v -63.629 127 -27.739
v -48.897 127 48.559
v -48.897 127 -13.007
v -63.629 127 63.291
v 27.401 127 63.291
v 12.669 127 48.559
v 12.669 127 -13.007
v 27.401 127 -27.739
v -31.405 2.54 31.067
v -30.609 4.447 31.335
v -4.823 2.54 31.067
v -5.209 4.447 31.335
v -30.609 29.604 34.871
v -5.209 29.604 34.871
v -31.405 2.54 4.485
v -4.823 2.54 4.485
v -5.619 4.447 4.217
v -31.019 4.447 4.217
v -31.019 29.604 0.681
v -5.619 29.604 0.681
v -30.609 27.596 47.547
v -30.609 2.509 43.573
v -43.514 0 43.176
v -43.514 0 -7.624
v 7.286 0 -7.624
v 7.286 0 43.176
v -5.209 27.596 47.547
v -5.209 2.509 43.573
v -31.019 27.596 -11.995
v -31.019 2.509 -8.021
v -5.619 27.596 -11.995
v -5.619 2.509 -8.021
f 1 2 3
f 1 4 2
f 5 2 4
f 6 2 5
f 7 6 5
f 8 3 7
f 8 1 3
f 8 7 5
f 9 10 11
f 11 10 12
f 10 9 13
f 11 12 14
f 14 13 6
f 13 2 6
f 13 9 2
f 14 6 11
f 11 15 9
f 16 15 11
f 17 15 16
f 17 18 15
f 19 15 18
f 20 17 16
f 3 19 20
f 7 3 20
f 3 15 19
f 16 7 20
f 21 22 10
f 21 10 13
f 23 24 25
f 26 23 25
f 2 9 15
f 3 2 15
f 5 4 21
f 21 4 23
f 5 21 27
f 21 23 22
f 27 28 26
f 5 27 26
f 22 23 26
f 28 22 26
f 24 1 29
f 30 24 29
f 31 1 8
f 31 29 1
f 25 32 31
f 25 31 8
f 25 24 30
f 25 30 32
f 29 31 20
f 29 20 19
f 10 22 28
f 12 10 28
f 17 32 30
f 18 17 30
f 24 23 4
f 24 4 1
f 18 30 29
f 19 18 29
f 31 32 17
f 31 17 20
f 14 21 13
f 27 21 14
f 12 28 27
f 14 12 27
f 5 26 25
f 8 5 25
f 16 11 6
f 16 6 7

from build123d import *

# Parameters (mm, degrees)
SKETCH1_W           = 50.8
SKETCH1_H           = 50.8
BOSS_EXTRUDE1_DEPTH = 127
BOSS_EXTRUDE1_DRAFT = -9
SKETCH2_W           = 61.565647843
SKETCH2_H           = 61.565647842
CUT_EXTRUDE1_DEPTH  = 124.46
CUT_EXTRUDE1_DRAFT  = -8
CUT_EXTRUDE2_REACH  = 165.697
SKETCH3_W           = 25.4
SKETCH3_H           = 25.4
CUT_EXTRUDE3_REACH  = 161.627
SKETCH4_W           = 25.4
SKETCH4_H           = 25.4


with BuildPart() as part:
    # Sketch1 → Boss-Extrude1 (with draft: the straight prism first)
    with BuildSketch(Plane(origin=(0, 0, 0), x_dir=(1, 0, 0), z_dir=(0, 1, 0))):
        with Locations((-18.114225515, -17.77595618)):
            Rectangle(SKETCH1_W, SKETCH1_H)
    extrude(amount=BOSS_EXTRUDE1_DEPTH)
    # Boss-Extrude1: the draft: its side faces are tilted about the plane it starts from
    boss_extrude1_sides = [part.faces().sort_by_distance(p)[0] for p in [
        (-43.514225515, 63.5, 17.77595618),
        (-18.114225515, 63.5, 43.17595618),
        (7.285774485, 63.5, 17.77595618),
        (-18.114225515, 63.5, -7.62404382),
    ]]
    draft(boss_extrude1_sides, Plane(origin=(0, 0, 0), x_dir=(1, 0, 0), z_dir=(0, 1, 0)), BOSS_EXTRUDE1_DRAFT)


with BuildPart() as cut_extrude1_tool:
    # Sketch2 → Cut-Extrude1 (with draft: the straight prism first)
    with BuildSketch(Plane(origin=(0, 127, 0), x_dir=(1, 0, 0), z_dir=(0, 1, 0))):
        with Locations((-18.114225515, -17.77595618)):
            Rectangle(SKETCH2_W, SKETCH2_H)
    extrude(amount=-CUT_EXTRUDE1_DEPTH)
    # Cut-Extrude1: the draft: its side faces are tilted about the plane it starts from
    cut_extrude1_sides = [cut_extrude1_tool.faces().sort_by_distance(p)[0] for p in [
        (-48.897049437, 64.77, 17.77595618),
        (-18.114225515, 64.77, 48.558780101),
        (12.668598406, 64.77, 17.77595618),
        (-18.114225515, 64.77, -13.006867741),
    ]]
    draft(cut_extrude1_sides, Plane(origin=(0, 127, 0), x_dir=(1, 0, 0), z_dir=(0, 1, 0)), CUT_EXTRUDE1_DRAFT)


with BuildPart() as part_1:
    add(part.part)

    # Cut-Extrude1: cut by cut_extrude1_tool
    add(cut_extrude1_tool.part, mode=Mode.SUBTRACT)

    # Cut-Extrude2: up to this plane
    cut_extrude2_end = Plane(origin=(-48.897049437, 127, 48.558780101), z_dir=(0, -0.1391731009600655, 0.9902680687415704))
    # Sketch3 → Cut-Extrude2 (cut, up to the surface)
    with BuildSketch(Plane(origin=(0, -6.671052104, 42.119365326), x_dir=(1, 0, 0), z_dir=(0, -0.15643446504023092, 0.9876883405951379)), mode=Mode.PRIVATE) as cut_extrude2_sk1:
        with Locations((-17.909049437, 21.994207608)):
            Rectangle(SKETCH3_W, SKETCH3_H)
    cut_extrude2_tool1 = split(extrude(cut_extrude2_sk1.sketch, amount=-CUT_EXTRUDE2_REACH, mode=Mode.PRIVATE), bisect_by=cut_extrude2_end, keep=Keep.BOTH, mode=Mode.PRIVATE)
    add(cut_extrude2_tool1.solids().sort_by_distance((-17.909049, 15.05237, 45.560017))[0], mode=Mode.SUBTRACT)

    # Cut-Extrude3: up to this plane
    cut_extrude3_end = Plane(origin=(-48.897049437, 127, -13.006867741), z_dir=(0, -0.1391731009600655, -0.9902680687415704))
    # Sketch4 → Cut-Extrude3 (cut, up to the surface)
    with BuildSketch(Plane(origin=(0, -1.177979553, -7.437470188), x_dir=(-1, 0, 0), z_dir=(0, -0.15643446504023092, -0.9876883405951379)), mode=Mode.PRIVATE) as cut_extrude3_sk1:
        with Locations((18.319401594, 16.432663216)):
            Rectangle(SKETCH4_W, SKETCH4_H)
    cut_extrude3_tool1 = split(extrude(cut_extrude3_sk1.sketch, amount=-CUT_EXTRUDE3_REACH, mode=Mode.PRIVATE), bisect_by=cut_extrude3_end, keep=Keep.BOTH, mode=Mode.PRIVATE)
    add(cut_extrude3_tool1.solids().sort_by_distance((-18.319402, 15.05237, -10.008105))[0], mode=Mode.SUBTRACT)


solid = part_1.part
